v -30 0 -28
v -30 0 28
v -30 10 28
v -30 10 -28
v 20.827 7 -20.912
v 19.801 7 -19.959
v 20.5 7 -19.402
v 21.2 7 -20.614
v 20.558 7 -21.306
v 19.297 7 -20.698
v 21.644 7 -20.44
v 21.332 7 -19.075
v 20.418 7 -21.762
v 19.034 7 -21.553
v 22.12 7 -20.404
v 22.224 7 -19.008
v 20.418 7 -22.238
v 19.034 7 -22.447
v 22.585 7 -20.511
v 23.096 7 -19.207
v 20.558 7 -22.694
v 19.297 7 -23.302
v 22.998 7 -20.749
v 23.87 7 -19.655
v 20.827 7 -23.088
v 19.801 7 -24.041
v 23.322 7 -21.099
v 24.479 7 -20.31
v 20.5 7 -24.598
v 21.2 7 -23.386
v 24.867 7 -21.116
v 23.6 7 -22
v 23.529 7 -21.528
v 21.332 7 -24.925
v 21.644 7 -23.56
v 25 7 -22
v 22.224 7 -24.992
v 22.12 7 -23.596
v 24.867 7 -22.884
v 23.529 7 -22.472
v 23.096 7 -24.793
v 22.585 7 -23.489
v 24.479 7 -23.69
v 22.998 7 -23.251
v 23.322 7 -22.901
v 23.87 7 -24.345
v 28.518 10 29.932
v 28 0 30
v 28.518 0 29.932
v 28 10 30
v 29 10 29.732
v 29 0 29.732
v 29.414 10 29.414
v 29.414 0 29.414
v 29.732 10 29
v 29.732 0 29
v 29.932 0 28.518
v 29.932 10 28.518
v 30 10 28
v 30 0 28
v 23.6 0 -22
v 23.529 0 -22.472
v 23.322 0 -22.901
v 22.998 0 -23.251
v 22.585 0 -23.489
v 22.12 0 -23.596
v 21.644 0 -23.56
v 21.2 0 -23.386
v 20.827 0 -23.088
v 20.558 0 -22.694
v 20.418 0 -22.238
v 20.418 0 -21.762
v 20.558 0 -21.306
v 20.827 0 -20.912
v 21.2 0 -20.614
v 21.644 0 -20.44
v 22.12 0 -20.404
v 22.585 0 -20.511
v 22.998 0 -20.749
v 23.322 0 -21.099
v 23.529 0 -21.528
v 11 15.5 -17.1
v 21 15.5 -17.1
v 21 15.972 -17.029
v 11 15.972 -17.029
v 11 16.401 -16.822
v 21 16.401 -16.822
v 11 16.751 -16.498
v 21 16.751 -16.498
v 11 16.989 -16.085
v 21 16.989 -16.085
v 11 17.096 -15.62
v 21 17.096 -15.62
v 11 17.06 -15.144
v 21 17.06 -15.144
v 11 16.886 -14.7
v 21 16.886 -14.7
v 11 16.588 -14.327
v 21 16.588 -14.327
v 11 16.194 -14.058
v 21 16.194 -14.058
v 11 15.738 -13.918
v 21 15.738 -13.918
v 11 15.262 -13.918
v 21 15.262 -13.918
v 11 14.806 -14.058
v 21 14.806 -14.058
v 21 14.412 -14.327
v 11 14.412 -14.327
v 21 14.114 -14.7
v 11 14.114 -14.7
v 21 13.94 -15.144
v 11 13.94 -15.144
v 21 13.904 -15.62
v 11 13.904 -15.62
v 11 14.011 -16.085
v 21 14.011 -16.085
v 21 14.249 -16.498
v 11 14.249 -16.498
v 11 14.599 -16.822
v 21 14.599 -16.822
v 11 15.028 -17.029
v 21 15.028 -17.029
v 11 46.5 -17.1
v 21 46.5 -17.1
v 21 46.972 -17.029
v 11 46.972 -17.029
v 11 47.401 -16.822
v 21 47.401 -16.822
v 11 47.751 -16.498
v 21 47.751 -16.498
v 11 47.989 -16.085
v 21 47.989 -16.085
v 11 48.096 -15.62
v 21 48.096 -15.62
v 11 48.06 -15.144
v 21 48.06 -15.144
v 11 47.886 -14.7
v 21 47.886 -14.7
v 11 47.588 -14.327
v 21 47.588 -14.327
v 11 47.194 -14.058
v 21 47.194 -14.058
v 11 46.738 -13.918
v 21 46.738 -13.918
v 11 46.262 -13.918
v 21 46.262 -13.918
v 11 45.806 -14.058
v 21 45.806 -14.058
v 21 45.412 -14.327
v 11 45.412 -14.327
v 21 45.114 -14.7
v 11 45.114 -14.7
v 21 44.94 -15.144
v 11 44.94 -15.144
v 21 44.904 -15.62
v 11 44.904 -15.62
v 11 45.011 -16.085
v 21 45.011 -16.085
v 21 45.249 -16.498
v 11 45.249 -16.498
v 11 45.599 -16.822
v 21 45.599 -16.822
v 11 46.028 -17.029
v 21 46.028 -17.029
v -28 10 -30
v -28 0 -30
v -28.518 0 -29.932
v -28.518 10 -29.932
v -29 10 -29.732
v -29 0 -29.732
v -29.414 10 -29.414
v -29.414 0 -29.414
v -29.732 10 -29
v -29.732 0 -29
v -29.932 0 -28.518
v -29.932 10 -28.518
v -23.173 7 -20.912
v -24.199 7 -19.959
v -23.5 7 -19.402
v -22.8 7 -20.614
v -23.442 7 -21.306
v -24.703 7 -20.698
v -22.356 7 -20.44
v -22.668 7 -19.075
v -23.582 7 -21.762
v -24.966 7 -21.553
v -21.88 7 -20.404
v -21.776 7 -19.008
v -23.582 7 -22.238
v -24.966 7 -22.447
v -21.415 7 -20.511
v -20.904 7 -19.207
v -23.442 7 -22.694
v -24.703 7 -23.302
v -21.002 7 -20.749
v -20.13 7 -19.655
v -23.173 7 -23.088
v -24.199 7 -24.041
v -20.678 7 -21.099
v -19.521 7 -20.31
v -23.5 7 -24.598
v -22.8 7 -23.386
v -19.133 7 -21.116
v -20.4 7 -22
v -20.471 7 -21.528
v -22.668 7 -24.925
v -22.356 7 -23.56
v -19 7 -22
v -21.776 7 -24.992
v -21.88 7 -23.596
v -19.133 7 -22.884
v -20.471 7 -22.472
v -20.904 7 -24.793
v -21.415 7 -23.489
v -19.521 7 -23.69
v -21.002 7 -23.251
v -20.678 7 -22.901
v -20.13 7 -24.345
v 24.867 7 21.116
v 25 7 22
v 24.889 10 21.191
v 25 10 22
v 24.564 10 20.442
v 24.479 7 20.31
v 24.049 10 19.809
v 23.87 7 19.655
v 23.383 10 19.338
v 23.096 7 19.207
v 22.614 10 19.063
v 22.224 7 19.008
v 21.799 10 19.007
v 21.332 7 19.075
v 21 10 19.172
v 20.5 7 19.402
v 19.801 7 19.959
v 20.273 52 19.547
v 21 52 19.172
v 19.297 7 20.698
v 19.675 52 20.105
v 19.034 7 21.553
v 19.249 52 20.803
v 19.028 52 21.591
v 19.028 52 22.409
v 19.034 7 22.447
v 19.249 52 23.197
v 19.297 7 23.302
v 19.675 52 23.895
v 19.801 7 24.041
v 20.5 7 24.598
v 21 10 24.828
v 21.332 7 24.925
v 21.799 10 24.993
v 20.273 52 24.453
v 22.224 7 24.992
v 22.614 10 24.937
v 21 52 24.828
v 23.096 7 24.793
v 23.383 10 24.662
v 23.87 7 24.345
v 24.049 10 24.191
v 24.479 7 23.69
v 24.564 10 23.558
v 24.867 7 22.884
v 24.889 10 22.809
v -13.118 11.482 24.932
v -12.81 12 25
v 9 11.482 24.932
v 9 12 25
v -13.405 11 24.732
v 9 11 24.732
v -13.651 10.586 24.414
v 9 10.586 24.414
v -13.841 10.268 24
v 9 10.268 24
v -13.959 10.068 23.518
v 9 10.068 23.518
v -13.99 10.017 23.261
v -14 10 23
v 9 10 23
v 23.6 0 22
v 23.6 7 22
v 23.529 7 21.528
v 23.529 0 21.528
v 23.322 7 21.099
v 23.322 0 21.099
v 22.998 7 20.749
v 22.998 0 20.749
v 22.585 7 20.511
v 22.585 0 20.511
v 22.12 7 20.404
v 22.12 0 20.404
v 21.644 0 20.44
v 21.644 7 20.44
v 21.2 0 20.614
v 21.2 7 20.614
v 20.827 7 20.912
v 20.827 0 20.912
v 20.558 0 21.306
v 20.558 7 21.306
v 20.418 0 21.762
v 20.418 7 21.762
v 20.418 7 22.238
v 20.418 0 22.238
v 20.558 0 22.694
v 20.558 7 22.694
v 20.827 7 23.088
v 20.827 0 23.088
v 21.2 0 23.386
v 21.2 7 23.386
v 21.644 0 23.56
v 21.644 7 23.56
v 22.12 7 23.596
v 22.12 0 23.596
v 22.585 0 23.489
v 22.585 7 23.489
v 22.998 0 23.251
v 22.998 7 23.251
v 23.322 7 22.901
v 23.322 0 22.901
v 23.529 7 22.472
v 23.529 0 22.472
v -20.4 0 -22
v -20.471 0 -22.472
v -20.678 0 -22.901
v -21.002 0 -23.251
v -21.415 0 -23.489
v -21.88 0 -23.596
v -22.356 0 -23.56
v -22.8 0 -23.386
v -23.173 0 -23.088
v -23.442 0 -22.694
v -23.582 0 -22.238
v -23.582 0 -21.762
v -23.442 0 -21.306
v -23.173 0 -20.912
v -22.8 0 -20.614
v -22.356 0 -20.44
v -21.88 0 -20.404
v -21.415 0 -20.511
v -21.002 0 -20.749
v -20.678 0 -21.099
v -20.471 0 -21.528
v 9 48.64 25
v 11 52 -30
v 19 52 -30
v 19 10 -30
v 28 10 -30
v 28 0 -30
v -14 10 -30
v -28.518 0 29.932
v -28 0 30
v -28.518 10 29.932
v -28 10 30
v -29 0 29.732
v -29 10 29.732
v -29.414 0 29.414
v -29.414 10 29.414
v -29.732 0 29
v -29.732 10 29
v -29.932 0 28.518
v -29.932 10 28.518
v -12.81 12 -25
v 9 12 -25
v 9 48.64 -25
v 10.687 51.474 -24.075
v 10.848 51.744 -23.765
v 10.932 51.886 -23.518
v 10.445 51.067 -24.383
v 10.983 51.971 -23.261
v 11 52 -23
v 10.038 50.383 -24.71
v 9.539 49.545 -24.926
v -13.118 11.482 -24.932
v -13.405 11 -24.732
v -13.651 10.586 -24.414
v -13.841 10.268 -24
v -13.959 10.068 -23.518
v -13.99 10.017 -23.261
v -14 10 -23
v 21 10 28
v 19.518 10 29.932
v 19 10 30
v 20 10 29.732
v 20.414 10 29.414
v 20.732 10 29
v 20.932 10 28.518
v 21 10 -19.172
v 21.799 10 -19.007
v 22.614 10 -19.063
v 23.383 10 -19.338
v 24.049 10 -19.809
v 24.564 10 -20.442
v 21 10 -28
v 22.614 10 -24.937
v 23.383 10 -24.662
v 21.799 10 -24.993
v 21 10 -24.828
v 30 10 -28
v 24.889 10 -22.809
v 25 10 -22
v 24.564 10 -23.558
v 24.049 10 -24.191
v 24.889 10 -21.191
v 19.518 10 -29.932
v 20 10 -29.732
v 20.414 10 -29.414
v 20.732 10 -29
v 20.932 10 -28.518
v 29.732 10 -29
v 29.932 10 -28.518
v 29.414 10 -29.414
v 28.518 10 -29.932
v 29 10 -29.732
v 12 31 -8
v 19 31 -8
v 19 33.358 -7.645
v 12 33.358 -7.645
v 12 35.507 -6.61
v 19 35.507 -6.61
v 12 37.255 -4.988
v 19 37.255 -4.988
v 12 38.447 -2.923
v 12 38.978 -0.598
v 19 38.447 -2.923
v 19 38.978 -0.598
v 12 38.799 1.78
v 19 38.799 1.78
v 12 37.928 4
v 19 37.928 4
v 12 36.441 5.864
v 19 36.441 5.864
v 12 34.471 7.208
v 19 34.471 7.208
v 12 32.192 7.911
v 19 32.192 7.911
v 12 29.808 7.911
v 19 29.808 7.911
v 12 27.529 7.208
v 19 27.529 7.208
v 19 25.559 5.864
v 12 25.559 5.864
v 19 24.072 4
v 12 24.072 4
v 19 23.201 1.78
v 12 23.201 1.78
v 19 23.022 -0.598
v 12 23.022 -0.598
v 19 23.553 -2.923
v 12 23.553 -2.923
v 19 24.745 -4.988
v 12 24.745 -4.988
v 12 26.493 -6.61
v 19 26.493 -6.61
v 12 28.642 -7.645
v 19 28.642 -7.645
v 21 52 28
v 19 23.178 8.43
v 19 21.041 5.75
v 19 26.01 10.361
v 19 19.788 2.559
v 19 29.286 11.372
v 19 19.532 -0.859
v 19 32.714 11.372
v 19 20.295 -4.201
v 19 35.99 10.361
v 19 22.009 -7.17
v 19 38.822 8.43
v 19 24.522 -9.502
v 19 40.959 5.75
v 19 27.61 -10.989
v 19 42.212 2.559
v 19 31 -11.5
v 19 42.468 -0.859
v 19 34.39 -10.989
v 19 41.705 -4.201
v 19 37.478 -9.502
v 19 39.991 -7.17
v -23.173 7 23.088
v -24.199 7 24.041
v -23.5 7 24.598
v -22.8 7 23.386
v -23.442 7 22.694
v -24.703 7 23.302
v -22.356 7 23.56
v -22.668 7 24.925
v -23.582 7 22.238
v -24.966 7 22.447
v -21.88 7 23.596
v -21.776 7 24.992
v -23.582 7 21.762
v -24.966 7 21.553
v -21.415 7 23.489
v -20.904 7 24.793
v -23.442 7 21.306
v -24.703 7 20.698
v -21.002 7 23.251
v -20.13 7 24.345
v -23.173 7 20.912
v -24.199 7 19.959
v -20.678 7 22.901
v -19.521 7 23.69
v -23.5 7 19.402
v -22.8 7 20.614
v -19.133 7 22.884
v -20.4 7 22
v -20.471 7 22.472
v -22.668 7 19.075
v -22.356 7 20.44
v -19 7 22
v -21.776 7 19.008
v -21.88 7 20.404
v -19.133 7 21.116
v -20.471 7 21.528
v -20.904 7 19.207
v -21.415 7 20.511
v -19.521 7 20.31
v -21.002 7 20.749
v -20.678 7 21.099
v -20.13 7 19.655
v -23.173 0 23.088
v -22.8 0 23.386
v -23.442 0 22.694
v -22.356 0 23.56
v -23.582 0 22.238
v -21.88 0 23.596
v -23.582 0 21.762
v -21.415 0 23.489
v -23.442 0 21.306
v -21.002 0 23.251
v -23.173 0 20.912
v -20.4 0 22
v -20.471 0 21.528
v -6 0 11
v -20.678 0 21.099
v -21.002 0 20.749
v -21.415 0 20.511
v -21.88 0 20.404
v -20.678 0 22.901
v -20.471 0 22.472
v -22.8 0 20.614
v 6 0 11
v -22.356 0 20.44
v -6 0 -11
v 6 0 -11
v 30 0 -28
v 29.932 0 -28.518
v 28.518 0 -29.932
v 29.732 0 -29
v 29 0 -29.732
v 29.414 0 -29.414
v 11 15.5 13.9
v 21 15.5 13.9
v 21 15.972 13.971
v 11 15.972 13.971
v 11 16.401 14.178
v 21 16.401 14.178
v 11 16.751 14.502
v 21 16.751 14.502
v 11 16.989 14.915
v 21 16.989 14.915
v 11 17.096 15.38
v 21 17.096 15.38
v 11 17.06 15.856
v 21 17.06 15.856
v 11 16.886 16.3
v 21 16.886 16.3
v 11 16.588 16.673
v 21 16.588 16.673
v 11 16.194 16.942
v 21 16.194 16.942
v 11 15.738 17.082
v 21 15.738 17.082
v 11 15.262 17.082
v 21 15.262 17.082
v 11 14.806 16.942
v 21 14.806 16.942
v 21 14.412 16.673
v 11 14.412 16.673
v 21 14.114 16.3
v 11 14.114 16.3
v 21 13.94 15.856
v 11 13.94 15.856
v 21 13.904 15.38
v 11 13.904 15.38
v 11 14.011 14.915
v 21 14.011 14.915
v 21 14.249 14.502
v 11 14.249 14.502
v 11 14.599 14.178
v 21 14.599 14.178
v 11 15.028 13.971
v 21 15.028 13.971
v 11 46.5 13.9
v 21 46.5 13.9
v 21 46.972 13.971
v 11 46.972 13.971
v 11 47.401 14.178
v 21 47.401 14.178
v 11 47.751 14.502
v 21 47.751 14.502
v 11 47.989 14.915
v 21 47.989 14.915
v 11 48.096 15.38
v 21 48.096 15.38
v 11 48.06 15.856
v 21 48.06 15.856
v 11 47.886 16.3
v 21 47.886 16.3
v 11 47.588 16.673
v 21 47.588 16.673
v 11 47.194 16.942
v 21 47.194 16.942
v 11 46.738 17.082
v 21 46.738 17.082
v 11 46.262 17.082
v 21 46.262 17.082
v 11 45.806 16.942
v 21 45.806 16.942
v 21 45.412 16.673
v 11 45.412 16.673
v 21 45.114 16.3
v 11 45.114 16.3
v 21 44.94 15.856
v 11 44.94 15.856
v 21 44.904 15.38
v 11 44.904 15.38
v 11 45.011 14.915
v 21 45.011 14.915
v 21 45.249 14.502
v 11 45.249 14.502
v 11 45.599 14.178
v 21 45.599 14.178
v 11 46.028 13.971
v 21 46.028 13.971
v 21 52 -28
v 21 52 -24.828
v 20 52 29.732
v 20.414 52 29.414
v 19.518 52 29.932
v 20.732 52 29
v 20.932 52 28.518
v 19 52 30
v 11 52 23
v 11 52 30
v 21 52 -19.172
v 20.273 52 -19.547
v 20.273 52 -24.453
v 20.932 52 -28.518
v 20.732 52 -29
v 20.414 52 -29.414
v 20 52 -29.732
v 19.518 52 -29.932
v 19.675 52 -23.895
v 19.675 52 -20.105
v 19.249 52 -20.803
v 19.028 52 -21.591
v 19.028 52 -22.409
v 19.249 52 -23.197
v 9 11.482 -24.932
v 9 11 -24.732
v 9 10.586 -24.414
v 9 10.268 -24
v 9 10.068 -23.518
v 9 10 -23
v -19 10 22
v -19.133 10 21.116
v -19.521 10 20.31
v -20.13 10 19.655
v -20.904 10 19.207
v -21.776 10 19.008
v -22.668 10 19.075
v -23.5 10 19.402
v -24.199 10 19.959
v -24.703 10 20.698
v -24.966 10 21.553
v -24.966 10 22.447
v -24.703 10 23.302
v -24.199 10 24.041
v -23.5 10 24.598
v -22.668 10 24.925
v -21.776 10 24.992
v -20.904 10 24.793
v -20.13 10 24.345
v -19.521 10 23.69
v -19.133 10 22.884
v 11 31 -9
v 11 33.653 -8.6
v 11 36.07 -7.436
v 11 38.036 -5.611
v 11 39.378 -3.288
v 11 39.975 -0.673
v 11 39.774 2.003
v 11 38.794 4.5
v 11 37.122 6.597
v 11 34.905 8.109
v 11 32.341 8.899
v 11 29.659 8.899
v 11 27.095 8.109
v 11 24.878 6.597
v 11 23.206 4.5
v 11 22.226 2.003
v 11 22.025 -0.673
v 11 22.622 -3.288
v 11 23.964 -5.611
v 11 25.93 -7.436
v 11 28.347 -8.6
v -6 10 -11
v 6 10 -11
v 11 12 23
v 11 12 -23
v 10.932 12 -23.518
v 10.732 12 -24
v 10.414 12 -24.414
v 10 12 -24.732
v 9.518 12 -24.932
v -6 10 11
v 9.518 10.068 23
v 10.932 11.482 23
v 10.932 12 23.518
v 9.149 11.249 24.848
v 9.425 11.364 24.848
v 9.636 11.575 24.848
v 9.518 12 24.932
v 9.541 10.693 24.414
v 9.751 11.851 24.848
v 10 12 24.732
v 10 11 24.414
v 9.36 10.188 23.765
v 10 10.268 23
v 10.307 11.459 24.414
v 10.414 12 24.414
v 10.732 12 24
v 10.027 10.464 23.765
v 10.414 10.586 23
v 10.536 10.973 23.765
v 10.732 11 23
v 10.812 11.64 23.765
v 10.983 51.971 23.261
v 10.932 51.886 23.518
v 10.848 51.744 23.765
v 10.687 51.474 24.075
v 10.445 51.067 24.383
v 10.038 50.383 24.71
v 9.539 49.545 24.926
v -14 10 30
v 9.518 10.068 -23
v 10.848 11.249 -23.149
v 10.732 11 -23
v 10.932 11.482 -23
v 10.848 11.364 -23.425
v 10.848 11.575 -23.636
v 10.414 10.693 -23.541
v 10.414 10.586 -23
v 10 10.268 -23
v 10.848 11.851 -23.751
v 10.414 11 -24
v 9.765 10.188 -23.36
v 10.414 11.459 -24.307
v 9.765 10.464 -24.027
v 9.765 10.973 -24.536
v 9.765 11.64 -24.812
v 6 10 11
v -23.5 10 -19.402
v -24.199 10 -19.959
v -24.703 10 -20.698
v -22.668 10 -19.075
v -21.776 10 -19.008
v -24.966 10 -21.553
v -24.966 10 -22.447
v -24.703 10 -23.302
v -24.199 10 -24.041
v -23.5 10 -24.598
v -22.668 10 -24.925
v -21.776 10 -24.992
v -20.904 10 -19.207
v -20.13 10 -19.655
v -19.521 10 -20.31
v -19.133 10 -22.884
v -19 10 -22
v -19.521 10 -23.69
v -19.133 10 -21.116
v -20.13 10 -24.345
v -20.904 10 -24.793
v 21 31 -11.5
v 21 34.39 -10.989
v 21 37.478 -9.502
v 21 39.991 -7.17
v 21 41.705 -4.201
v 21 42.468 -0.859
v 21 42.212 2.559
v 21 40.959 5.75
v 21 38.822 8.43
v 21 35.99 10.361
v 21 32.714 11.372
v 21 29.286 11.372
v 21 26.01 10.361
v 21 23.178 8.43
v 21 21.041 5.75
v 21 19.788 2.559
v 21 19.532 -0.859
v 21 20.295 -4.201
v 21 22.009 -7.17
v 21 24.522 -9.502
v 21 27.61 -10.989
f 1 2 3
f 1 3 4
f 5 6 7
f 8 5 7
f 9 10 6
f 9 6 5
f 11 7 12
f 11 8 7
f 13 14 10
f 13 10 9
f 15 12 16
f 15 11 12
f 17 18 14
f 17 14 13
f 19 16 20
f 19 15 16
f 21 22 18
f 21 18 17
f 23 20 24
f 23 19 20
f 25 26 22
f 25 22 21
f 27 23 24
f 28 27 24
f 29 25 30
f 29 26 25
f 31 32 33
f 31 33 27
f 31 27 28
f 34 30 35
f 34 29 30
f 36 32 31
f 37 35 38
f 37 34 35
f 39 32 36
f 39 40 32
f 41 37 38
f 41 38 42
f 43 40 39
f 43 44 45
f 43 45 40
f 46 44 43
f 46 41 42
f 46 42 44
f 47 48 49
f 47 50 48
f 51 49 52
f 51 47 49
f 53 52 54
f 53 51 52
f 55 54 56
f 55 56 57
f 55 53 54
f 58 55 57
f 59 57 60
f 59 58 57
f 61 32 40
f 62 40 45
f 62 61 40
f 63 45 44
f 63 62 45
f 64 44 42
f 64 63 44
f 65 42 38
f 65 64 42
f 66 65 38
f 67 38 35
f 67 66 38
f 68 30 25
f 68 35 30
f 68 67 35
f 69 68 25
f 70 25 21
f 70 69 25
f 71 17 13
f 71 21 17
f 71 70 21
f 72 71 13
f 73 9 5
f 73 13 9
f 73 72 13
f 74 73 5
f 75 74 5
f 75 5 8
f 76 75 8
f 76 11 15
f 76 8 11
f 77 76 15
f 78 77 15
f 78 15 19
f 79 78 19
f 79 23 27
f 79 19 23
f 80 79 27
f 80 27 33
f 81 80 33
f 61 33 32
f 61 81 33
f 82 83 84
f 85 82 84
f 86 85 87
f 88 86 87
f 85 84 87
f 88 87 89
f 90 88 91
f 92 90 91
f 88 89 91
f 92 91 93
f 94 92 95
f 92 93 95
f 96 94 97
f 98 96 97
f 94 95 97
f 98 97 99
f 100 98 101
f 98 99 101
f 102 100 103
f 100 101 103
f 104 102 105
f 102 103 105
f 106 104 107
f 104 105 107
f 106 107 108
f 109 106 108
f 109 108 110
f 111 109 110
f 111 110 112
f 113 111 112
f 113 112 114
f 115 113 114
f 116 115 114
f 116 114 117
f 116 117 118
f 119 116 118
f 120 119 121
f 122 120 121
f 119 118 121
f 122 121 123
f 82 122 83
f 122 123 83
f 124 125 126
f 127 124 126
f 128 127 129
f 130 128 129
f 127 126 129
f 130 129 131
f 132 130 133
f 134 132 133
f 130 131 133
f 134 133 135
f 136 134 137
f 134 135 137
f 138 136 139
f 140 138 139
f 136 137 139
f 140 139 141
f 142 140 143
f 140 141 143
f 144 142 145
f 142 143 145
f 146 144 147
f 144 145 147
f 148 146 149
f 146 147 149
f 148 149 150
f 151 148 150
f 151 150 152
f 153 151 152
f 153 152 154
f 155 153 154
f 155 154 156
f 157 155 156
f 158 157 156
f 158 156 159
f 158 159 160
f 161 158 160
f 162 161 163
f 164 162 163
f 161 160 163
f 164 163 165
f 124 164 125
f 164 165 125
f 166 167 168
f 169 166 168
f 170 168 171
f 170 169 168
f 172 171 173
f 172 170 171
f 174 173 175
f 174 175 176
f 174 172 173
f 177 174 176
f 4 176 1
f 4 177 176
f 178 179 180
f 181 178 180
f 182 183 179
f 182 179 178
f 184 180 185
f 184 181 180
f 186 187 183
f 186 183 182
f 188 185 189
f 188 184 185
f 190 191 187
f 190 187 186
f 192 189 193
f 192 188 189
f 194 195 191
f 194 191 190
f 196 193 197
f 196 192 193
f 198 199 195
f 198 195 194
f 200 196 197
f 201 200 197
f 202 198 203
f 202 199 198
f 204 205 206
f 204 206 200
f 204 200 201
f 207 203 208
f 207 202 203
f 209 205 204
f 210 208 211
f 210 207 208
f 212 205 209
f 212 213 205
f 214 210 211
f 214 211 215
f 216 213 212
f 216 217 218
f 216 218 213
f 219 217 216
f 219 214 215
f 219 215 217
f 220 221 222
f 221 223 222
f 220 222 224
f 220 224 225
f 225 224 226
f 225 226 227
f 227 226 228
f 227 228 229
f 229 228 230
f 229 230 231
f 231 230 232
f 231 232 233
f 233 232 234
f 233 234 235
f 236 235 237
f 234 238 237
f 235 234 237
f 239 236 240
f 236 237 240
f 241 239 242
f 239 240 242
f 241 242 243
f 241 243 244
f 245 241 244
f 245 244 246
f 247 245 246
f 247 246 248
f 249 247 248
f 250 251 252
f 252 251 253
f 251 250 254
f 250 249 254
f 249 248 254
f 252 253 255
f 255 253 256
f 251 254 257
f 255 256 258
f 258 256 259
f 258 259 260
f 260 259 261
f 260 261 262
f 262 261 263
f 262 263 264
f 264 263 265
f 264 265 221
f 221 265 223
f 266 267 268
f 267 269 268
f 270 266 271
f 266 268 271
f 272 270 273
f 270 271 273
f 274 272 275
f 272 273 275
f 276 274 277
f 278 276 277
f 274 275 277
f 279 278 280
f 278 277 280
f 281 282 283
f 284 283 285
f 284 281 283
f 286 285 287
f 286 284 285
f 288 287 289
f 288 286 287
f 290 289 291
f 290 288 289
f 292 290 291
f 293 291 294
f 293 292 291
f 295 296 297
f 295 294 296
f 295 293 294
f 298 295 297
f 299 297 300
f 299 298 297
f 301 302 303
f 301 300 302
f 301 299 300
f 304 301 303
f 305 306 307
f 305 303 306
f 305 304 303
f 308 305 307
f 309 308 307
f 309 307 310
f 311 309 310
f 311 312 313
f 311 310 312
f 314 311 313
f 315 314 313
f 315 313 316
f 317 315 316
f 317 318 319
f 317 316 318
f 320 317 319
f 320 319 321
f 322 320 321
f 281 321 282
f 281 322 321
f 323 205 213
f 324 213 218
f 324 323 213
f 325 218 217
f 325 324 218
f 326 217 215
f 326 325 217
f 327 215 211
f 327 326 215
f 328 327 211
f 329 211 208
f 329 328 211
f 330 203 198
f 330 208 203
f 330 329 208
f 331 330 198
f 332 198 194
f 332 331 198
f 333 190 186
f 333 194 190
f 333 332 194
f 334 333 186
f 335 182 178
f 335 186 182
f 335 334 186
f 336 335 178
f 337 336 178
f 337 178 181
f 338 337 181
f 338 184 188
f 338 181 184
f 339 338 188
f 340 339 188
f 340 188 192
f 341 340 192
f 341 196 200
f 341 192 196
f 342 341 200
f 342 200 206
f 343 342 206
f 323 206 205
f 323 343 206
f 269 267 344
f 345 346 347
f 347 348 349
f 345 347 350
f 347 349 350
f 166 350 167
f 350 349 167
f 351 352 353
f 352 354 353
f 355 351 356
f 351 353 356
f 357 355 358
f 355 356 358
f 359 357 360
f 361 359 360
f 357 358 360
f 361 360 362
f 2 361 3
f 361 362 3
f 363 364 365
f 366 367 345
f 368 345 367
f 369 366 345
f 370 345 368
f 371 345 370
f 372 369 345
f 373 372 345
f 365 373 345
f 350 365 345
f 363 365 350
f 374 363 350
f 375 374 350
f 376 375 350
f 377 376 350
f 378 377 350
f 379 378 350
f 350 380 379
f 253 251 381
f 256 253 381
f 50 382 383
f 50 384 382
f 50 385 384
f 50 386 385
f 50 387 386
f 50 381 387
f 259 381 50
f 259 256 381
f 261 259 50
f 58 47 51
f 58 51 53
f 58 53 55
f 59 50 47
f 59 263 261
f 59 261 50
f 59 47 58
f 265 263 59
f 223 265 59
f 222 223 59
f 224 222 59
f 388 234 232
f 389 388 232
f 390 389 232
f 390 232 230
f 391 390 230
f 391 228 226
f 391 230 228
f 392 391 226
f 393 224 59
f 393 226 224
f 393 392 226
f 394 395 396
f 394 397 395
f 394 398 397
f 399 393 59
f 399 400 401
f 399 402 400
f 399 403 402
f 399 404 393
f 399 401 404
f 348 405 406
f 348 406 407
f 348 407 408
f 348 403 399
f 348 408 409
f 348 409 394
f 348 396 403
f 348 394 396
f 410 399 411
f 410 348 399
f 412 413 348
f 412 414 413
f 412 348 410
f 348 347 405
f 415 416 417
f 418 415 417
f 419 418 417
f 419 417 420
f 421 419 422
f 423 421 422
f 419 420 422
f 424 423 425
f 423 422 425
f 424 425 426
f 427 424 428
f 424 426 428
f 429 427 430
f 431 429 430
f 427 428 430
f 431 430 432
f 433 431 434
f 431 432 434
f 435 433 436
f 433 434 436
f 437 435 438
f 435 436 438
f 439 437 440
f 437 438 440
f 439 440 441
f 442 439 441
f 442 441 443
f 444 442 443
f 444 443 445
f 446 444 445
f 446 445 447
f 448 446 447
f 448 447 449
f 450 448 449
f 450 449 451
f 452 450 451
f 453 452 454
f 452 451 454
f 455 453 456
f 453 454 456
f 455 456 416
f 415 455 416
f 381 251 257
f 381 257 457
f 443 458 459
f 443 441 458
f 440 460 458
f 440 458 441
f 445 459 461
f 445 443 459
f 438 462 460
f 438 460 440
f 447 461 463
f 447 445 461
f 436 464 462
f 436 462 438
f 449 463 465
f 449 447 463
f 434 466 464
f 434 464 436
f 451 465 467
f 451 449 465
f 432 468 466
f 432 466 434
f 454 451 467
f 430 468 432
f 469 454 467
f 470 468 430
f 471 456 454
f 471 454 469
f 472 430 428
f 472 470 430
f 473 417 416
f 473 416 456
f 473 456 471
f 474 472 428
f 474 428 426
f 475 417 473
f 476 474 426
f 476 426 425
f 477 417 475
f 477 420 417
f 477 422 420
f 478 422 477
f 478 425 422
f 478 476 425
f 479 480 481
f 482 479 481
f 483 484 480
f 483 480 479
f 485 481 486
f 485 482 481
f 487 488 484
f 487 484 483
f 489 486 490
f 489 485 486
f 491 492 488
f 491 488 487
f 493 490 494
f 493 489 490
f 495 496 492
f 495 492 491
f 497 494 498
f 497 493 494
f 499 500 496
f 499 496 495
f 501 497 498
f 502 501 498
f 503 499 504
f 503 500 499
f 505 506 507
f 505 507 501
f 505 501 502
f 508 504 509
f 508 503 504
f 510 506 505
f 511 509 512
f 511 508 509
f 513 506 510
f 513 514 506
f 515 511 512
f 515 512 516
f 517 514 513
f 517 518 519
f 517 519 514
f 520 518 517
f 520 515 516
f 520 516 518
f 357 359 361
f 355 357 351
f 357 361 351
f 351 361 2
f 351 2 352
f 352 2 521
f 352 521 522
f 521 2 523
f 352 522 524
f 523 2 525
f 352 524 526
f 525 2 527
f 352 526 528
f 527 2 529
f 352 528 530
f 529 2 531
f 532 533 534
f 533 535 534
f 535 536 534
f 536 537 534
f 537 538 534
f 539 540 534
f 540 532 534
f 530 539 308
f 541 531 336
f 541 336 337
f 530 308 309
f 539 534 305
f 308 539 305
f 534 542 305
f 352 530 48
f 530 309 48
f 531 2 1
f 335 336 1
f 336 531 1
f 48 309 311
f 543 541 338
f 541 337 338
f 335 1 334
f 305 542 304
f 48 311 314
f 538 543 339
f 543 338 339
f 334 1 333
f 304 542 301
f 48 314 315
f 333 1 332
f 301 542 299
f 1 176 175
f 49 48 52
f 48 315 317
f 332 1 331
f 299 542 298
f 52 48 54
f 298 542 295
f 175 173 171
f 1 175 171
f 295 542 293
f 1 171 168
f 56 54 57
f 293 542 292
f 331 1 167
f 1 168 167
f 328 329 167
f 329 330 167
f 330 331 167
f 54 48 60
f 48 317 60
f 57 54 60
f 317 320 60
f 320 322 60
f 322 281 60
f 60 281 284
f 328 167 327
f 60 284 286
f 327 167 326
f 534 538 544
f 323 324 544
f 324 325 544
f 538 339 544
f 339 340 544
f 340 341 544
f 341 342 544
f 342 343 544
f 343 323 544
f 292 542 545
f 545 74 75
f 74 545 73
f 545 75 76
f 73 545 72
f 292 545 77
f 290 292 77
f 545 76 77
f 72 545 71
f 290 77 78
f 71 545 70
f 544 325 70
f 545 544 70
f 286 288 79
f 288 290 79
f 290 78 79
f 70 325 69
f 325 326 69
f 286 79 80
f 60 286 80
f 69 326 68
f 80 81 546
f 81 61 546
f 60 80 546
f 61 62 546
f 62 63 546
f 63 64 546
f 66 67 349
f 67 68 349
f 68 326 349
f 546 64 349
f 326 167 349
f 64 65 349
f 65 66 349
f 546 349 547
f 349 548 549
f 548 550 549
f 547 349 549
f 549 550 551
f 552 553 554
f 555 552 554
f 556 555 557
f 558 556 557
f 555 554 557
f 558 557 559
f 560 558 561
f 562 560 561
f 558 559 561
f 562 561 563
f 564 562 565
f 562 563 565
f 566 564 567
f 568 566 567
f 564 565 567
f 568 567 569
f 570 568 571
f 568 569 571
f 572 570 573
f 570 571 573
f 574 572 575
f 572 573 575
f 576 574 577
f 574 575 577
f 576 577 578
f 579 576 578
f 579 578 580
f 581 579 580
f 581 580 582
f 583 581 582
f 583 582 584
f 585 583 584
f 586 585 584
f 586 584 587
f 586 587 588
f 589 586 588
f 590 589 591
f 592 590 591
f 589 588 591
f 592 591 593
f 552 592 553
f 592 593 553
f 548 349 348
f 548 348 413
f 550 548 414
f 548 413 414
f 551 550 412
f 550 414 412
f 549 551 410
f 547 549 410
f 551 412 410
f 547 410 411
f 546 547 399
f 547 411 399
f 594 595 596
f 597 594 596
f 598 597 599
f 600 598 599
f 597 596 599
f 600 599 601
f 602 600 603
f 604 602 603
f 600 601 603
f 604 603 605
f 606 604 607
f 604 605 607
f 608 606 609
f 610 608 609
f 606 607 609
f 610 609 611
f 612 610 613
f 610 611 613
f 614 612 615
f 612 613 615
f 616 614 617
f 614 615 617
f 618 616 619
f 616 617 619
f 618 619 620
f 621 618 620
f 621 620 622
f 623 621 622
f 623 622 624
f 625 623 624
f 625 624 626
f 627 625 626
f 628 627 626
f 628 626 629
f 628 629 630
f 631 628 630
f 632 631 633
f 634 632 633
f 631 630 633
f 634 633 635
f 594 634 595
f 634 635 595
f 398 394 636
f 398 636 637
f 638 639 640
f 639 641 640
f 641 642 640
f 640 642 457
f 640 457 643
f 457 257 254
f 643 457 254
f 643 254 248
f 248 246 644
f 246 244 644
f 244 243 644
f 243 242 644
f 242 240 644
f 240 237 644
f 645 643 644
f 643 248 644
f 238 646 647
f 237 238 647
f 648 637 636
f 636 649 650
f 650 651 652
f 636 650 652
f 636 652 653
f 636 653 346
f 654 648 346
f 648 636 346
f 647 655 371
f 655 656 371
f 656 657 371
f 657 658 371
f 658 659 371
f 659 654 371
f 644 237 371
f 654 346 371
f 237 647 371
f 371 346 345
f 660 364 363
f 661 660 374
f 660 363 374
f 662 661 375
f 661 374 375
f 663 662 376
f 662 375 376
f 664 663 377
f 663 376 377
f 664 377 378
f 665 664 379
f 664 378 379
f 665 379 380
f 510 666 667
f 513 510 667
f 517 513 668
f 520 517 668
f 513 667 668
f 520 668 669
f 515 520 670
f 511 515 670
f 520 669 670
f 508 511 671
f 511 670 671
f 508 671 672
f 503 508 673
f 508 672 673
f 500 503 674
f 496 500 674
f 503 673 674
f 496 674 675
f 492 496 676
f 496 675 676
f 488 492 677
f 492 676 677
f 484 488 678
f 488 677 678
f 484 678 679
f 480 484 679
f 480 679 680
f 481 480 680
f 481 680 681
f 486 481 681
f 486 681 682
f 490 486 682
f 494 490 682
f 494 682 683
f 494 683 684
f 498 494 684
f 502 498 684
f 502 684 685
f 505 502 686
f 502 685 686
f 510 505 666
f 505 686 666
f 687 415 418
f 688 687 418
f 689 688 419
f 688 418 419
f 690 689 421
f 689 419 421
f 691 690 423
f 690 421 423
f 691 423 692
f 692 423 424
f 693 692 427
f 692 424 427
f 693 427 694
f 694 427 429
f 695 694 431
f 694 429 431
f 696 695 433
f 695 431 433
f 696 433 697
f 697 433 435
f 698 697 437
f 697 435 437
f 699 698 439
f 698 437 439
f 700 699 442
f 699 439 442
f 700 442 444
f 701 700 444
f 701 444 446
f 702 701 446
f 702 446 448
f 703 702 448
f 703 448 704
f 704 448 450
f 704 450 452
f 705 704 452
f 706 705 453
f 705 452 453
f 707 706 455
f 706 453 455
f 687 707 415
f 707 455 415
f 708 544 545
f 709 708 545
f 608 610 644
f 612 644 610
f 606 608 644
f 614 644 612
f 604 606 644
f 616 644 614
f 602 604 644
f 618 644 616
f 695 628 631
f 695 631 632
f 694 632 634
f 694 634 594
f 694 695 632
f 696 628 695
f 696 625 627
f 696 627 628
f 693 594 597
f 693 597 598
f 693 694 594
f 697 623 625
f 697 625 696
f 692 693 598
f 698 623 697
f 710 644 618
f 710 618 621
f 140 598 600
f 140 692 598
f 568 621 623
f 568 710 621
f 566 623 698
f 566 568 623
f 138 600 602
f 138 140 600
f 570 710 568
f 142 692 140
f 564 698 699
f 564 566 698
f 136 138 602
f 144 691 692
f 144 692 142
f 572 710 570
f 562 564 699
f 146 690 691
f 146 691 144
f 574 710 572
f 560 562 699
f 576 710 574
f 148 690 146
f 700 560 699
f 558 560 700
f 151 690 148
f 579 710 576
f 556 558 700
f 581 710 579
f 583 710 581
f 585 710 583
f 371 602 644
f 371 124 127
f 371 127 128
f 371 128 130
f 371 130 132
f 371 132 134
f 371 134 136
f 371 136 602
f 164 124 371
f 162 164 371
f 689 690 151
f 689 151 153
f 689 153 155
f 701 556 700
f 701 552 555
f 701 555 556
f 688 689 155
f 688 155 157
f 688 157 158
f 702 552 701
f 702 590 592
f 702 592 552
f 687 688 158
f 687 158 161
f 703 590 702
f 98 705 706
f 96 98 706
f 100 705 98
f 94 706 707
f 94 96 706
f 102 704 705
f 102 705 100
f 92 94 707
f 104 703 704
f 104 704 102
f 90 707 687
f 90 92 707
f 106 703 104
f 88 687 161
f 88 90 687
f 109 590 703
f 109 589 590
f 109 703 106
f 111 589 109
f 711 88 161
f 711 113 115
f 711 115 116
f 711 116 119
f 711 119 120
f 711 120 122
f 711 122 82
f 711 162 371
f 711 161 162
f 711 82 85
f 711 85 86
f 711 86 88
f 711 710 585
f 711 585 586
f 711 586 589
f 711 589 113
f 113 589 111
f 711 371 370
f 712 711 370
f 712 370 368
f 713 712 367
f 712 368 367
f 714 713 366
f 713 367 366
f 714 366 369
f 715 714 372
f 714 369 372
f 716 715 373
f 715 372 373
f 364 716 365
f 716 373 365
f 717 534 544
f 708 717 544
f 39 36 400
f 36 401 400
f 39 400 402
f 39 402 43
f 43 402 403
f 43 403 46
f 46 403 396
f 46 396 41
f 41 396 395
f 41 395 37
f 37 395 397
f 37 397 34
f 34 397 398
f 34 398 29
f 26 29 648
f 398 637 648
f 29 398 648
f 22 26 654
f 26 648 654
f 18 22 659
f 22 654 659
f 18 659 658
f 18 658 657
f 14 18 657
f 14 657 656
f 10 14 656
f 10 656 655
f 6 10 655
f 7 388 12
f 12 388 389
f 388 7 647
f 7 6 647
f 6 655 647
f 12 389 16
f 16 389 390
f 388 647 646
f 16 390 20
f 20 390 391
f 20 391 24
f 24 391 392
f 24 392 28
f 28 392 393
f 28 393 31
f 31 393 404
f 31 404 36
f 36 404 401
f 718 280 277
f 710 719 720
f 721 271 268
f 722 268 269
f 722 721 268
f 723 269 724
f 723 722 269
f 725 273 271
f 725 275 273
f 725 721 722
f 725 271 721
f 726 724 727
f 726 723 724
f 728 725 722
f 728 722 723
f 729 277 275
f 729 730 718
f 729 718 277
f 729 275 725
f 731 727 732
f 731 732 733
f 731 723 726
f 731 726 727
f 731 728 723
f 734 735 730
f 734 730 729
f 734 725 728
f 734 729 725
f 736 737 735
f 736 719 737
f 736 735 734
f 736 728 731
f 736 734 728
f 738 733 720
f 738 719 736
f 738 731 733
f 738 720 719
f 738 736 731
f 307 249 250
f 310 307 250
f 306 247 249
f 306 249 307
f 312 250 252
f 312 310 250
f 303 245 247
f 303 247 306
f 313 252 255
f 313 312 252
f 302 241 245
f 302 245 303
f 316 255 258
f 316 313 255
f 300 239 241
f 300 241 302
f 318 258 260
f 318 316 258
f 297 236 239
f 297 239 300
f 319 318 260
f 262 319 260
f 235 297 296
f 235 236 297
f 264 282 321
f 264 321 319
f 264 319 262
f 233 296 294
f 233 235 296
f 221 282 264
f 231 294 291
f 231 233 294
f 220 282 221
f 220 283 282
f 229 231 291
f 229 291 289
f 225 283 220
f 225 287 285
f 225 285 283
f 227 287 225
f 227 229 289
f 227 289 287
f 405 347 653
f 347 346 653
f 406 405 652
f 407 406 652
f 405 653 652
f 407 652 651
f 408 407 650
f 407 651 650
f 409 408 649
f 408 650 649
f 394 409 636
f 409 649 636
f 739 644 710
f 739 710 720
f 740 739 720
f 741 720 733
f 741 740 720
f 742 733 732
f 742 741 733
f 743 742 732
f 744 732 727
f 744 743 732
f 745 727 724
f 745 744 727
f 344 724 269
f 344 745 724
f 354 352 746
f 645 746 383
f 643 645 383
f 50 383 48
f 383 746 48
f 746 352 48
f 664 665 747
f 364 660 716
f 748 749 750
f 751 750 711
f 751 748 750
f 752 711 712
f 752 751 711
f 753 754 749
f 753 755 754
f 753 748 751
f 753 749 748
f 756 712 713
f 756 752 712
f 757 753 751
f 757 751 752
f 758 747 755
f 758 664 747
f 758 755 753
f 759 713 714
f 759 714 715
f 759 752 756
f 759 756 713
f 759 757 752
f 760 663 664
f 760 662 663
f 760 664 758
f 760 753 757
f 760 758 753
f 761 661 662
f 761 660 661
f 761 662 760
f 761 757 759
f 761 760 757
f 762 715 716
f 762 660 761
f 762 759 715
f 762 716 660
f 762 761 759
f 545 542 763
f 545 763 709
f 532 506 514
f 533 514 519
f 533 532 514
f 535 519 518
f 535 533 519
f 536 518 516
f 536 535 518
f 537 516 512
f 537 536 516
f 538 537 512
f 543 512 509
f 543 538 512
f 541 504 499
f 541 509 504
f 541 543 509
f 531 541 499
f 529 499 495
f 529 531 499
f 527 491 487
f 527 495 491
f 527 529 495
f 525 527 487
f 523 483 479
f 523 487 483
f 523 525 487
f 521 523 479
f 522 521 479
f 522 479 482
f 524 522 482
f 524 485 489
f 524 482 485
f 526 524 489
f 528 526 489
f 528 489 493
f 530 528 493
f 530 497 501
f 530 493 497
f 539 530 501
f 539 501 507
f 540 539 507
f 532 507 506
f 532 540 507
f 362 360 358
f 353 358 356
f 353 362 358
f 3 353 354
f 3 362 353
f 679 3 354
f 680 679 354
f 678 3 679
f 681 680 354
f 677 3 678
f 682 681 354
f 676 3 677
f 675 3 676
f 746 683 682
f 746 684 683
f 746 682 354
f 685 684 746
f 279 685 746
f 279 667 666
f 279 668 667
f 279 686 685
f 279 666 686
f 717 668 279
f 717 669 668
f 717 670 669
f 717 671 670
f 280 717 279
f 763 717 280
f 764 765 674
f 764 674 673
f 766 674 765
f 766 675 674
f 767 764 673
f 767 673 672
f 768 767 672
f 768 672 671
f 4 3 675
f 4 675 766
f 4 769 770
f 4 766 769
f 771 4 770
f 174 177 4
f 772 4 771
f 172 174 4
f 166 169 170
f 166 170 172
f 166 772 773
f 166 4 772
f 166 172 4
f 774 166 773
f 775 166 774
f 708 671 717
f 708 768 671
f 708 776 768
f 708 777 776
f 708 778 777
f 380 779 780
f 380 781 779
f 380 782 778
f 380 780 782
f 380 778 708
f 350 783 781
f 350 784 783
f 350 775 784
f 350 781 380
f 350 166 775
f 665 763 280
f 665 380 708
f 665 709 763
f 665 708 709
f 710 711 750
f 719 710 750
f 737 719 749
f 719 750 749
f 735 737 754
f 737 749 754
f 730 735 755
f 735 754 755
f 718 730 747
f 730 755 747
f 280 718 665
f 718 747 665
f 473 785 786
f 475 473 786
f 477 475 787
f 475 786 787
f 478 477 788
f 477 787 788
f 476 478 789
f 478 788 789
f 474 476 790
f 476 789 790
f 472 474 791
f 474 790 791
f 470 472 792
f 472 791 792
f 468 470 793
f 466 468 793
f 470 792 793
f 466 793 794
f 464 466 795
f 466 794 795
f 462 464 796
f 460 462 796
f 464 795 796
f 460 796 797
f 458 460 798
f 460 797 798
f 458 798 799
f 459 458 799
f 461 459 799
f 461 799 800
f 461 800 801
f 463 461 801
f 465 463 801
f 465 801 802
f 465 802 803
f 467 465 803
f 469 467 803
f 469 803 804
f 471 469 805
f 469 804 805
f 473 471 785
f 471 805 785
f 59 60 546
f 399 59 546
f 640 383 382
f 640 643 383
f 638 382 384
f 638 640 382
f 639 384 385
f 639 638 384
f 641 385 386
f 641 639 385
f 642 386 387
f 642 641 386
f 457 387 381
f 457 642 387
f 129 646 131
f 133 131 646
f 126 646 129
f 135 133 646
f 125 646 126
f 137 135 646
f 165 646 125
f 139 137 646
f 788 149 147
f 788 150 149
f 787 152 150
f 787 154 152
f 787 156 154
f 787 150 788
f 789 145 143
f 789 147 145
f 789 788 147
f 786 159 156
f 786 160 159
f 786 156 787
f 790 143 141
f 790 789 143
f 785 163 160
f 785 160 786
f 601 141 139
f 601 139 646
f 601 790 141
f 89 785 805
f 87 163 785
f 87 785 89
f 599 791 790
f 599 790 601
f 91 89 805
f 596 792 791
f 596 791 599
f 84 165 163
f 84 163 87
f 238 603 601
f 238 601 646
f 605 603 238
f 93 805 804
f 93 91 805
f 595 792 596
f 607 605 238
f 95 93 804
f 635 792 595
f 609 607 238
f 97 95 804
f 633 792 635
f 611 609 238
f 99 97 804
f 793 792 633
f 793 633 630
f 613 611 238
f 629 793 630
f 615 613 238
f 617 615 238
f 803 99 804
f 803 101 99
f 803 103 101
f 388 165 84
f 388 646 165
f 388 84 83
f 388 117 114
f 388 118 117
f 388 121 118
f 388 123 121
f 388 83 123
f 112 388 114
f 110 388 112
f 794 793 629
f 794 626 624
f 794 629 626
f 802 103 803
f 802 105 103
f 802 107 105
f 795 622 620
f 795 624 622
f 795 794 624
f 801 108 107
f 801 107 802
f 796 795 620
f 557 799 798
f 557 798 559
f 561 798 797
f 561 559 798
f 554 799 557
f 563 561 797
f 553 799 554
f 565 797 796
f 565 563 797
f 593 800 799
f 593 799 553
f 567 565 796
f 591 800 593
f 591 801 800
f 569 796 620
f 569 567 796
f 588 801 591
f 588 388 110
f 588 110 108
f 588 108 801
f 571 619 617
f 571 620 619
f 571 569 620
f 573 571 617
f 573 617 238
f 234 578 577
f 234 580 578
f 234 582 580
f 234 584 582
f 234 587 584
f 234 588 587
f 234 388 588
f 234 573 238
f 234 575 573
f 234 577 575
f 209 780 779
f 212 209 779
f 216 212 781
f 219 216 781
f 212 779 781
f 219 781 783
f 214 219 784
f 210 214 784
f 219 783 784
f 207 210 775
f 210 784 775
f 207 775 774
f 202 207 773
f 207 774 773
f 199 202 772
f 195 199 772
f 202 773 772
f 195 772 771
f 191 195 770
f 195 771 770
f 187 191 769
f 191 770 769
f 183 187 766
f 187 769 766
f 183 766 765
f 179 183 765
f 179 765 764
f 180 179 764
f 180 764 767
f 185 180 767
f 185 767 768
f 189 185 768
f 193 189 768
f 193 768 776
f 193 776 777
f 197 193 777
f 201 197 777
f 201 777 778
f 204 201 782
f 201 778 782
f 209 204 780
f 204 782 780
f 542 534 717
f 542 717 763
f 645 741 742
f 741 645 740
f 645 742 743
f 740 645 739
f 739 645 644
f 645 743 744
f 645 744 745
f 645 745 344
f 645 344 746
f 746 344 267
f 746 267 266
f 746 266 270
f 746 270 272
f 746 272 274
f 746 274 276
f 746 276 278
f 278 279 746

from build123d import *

# Parameters (mm, degrees)
SKETCH1_W               = 60
SKETCH1_H               = 60
SKETCH1_R               = 1.6
SKETCH1_W_2             = 12
SKETCH1_H_2             = 22
BOSS_EXTRUDE1_DEPTH     = 10
BOSS_EXTRUDE2_DEPTH     = 42
SKETCH3_R               = 11.5
CUT_EXTRUDE1_DEPTH      = 2
SKETCH4_R               = 8
CUT_EXTRUDE2_DEPTH      = 8
SKETCH5_R               = 1.6
CUT_EXTRUDE3_DEPTH      = 10
SKETCH6_R               = 3
CUT_EXTRUDE4_DEPTH      = 3
SKETCH7_R               = 3
CUT_EXTRUDE5_DEPTH      = 43
CUT_EXTRUDE6_DEPTH      = 31
CUT_EXTRUDE6_DEPTH_BACK = 31
FILLET1_R               = 2
FILLET2_R               = 2
CHAMFER1_SIZE           = 1


with BuildPart() as part:
    # Sketch1 → Boss-Extrude1 (new body)
    with BuildSketch(Plane(origin=(0, 0, 0), x_dir=(1, 0, 0), z_dir=(0, 1, 0))):
        Rectangle(SKETCH1_W, SKETCH1_H)
        with Locations((-22, 22)):
            Circle(SKETCH1_R, mode=Mode.SUBTRACT)
        with Locations((22, 22)):
            Circle(SKETCH1_R, mode=Mode.SUBTRACT)
        with Locations((-22, -22)):
            Circle(SKETCH1_R, mode=Mode.SUBTRACT)
        with Locations((22, -22)):
            Circle(SKETCH1_R, mode=Mode.SUBTRACT)
        Rectangle(SKETCH1_W_2, SKETCH1_H_2, mode=Mode.SUBTRACT)
    extrude(amount=BOSS_EXTRUDE1_DEPTH)

    # Sketch2 → Boss-Extrude2 (add)
    with BuildSketch(Plane(origin=(0, 10, 0), x_dir=(1, 0, 0), z_dir=(0, 1, 0))):
        Polygon((11, 30), (21, 30), (21, -30), (11, -30), (-14, -30), (-14, -25), (11, -25), (11, 25), (-14, 25), (-14, 30), align=None)
    extrude(amount=BOSS_EXTRUDE2_DEPTH)

    # Sketch3 → Cut-Extrude1 (cut)
    with BuildSketch(Plane(origin=(21, 0, 0), x_dir=(0, 0, -1), z_dir=(1, 0, 0))):
        with Locations((0, 31)):
            Circle(SKETCH3_R)
    extrude(amount=-CUT_EXTRUDE1_DEPTH, mode=Mode.SUBTRACT)

    # Sketch4 → Cut-Extrude2 (cut)
    with BuildSketch(Plane(origin=(19, 0, 0), x_dir=(0, 0, -1), z_dir=(1, 0, 0))):
        with Locations((0, 31)):
            Circle(SKETCH4_R)
    extrude(amount=-CUT_EXTRUDE2_DEPTH, mode=Mode.SUBTRACT)

    # Sketch5 → Cut-Extrude3 (cut)
    with BuildSketch(Plane(origin=(21, 0, 0), x_dir=(0, 0, -1), z_dir=(1, 0, 0))):
        with Locations((-15.5, 46.5)):
            Circle(SKETCH5_R)
        with Locations((15.5, 46.5)):
            Circle(SKETCH5_R)
        with Locations((15.5, 15.5)):
            Circle(SKETCH5_R)
        with Locations((-15.5, 15.5)):
            Circle(SKETCH5_R)
    extrude(amount=-CUT_EXTRUDE3_DEPTH, mode=Mode.SUBTRACT)

    # Sketch6 → Cut-Extrude4 (cut)
    with BuildSketch(Plane(origin=(0, 10, 0), x_dir=(1, 0, 0), z_dir=(0, 1, 0))):
        with Locations((-22, 22)):
            Circle(SKETCH6_R)
        with Locations((22, 22)):
            Circle(SKETCH6_R)
        with Locations((22, -22)):
            Circle(SKETCH6_R)
        with Locations((-22, -22)):
            Circle(SKETCH6_R)
    extrude(amount=-CUT_EXTRUDE4_DEPTH, mode=Mode.SUBTRACT)

    # Sketch7 → Cut-Extrude5 (cut, through all)
    with BuildSketch(Plane(origin=(0, 10, 0), x_dir=(1, 0, 0), z_dir=(0, 1, 0))):
        with Locations((22, 22)):
            Circle(SKETCH7_R)
        with Locations((22, -22)):
            Circle(SKETCH7_R)
    extrude(amount=CUT_EXTRUDE5_DEPTH, mode=Mode.SUBTRACT)

    # Sketch10 → Cut-Extrude6 (cut, two sides)
    with BuildSketch(Plane.XY) as cut_extrude6_sk:
        Polygon((11, 52), (-14, 10), (-19.679988527, 22.361973952), (-19.679988527, 54.584490378), (11, 54.584490378), align=None)
    extrude(amount=CUT_EXTRUDE6_DEPTH, mode=Mode.SUBTRACT)
    extrude(cut_extrude6_sk.sketch, amount=-CUT_EXTRUDE6_DEPTH_BACK, mode=Mode.SUBTRACT)

    # Fillet1
    fillet1_edges = [part.edges().sort_by_distance(p)[0] for p in [
        (21, 31, 30),
        (21, 31, -30),
        (-1.5, 10, -25),
        (11, 10, 0),
        (11, 31, -25),
        (-1.5, 10, 25),
        (11, 31, 25),
    ]]
    fillet(fillet1_edges, radius=FILLET1_R)

    # Fillet2
    fillet2_edges = [part.edges().sort_by_distance(p)[0] for p in [
        (30, 5, 30),
        (-30, 5, 30),
        (-30, 5, -30),
        (30, 5, -30),
    ]]
    fillet(fillet2_edges, radius=FILLET2_R)

    # Chamfer1
    chamfer1_edges = [part.edges().sort_by_distance(p)[0] for p in [
        (11, 31, 8),
    ]]
    chamfer(chamfer1_edges, length=CHAMFER1_SIZE)


solid = part.part
